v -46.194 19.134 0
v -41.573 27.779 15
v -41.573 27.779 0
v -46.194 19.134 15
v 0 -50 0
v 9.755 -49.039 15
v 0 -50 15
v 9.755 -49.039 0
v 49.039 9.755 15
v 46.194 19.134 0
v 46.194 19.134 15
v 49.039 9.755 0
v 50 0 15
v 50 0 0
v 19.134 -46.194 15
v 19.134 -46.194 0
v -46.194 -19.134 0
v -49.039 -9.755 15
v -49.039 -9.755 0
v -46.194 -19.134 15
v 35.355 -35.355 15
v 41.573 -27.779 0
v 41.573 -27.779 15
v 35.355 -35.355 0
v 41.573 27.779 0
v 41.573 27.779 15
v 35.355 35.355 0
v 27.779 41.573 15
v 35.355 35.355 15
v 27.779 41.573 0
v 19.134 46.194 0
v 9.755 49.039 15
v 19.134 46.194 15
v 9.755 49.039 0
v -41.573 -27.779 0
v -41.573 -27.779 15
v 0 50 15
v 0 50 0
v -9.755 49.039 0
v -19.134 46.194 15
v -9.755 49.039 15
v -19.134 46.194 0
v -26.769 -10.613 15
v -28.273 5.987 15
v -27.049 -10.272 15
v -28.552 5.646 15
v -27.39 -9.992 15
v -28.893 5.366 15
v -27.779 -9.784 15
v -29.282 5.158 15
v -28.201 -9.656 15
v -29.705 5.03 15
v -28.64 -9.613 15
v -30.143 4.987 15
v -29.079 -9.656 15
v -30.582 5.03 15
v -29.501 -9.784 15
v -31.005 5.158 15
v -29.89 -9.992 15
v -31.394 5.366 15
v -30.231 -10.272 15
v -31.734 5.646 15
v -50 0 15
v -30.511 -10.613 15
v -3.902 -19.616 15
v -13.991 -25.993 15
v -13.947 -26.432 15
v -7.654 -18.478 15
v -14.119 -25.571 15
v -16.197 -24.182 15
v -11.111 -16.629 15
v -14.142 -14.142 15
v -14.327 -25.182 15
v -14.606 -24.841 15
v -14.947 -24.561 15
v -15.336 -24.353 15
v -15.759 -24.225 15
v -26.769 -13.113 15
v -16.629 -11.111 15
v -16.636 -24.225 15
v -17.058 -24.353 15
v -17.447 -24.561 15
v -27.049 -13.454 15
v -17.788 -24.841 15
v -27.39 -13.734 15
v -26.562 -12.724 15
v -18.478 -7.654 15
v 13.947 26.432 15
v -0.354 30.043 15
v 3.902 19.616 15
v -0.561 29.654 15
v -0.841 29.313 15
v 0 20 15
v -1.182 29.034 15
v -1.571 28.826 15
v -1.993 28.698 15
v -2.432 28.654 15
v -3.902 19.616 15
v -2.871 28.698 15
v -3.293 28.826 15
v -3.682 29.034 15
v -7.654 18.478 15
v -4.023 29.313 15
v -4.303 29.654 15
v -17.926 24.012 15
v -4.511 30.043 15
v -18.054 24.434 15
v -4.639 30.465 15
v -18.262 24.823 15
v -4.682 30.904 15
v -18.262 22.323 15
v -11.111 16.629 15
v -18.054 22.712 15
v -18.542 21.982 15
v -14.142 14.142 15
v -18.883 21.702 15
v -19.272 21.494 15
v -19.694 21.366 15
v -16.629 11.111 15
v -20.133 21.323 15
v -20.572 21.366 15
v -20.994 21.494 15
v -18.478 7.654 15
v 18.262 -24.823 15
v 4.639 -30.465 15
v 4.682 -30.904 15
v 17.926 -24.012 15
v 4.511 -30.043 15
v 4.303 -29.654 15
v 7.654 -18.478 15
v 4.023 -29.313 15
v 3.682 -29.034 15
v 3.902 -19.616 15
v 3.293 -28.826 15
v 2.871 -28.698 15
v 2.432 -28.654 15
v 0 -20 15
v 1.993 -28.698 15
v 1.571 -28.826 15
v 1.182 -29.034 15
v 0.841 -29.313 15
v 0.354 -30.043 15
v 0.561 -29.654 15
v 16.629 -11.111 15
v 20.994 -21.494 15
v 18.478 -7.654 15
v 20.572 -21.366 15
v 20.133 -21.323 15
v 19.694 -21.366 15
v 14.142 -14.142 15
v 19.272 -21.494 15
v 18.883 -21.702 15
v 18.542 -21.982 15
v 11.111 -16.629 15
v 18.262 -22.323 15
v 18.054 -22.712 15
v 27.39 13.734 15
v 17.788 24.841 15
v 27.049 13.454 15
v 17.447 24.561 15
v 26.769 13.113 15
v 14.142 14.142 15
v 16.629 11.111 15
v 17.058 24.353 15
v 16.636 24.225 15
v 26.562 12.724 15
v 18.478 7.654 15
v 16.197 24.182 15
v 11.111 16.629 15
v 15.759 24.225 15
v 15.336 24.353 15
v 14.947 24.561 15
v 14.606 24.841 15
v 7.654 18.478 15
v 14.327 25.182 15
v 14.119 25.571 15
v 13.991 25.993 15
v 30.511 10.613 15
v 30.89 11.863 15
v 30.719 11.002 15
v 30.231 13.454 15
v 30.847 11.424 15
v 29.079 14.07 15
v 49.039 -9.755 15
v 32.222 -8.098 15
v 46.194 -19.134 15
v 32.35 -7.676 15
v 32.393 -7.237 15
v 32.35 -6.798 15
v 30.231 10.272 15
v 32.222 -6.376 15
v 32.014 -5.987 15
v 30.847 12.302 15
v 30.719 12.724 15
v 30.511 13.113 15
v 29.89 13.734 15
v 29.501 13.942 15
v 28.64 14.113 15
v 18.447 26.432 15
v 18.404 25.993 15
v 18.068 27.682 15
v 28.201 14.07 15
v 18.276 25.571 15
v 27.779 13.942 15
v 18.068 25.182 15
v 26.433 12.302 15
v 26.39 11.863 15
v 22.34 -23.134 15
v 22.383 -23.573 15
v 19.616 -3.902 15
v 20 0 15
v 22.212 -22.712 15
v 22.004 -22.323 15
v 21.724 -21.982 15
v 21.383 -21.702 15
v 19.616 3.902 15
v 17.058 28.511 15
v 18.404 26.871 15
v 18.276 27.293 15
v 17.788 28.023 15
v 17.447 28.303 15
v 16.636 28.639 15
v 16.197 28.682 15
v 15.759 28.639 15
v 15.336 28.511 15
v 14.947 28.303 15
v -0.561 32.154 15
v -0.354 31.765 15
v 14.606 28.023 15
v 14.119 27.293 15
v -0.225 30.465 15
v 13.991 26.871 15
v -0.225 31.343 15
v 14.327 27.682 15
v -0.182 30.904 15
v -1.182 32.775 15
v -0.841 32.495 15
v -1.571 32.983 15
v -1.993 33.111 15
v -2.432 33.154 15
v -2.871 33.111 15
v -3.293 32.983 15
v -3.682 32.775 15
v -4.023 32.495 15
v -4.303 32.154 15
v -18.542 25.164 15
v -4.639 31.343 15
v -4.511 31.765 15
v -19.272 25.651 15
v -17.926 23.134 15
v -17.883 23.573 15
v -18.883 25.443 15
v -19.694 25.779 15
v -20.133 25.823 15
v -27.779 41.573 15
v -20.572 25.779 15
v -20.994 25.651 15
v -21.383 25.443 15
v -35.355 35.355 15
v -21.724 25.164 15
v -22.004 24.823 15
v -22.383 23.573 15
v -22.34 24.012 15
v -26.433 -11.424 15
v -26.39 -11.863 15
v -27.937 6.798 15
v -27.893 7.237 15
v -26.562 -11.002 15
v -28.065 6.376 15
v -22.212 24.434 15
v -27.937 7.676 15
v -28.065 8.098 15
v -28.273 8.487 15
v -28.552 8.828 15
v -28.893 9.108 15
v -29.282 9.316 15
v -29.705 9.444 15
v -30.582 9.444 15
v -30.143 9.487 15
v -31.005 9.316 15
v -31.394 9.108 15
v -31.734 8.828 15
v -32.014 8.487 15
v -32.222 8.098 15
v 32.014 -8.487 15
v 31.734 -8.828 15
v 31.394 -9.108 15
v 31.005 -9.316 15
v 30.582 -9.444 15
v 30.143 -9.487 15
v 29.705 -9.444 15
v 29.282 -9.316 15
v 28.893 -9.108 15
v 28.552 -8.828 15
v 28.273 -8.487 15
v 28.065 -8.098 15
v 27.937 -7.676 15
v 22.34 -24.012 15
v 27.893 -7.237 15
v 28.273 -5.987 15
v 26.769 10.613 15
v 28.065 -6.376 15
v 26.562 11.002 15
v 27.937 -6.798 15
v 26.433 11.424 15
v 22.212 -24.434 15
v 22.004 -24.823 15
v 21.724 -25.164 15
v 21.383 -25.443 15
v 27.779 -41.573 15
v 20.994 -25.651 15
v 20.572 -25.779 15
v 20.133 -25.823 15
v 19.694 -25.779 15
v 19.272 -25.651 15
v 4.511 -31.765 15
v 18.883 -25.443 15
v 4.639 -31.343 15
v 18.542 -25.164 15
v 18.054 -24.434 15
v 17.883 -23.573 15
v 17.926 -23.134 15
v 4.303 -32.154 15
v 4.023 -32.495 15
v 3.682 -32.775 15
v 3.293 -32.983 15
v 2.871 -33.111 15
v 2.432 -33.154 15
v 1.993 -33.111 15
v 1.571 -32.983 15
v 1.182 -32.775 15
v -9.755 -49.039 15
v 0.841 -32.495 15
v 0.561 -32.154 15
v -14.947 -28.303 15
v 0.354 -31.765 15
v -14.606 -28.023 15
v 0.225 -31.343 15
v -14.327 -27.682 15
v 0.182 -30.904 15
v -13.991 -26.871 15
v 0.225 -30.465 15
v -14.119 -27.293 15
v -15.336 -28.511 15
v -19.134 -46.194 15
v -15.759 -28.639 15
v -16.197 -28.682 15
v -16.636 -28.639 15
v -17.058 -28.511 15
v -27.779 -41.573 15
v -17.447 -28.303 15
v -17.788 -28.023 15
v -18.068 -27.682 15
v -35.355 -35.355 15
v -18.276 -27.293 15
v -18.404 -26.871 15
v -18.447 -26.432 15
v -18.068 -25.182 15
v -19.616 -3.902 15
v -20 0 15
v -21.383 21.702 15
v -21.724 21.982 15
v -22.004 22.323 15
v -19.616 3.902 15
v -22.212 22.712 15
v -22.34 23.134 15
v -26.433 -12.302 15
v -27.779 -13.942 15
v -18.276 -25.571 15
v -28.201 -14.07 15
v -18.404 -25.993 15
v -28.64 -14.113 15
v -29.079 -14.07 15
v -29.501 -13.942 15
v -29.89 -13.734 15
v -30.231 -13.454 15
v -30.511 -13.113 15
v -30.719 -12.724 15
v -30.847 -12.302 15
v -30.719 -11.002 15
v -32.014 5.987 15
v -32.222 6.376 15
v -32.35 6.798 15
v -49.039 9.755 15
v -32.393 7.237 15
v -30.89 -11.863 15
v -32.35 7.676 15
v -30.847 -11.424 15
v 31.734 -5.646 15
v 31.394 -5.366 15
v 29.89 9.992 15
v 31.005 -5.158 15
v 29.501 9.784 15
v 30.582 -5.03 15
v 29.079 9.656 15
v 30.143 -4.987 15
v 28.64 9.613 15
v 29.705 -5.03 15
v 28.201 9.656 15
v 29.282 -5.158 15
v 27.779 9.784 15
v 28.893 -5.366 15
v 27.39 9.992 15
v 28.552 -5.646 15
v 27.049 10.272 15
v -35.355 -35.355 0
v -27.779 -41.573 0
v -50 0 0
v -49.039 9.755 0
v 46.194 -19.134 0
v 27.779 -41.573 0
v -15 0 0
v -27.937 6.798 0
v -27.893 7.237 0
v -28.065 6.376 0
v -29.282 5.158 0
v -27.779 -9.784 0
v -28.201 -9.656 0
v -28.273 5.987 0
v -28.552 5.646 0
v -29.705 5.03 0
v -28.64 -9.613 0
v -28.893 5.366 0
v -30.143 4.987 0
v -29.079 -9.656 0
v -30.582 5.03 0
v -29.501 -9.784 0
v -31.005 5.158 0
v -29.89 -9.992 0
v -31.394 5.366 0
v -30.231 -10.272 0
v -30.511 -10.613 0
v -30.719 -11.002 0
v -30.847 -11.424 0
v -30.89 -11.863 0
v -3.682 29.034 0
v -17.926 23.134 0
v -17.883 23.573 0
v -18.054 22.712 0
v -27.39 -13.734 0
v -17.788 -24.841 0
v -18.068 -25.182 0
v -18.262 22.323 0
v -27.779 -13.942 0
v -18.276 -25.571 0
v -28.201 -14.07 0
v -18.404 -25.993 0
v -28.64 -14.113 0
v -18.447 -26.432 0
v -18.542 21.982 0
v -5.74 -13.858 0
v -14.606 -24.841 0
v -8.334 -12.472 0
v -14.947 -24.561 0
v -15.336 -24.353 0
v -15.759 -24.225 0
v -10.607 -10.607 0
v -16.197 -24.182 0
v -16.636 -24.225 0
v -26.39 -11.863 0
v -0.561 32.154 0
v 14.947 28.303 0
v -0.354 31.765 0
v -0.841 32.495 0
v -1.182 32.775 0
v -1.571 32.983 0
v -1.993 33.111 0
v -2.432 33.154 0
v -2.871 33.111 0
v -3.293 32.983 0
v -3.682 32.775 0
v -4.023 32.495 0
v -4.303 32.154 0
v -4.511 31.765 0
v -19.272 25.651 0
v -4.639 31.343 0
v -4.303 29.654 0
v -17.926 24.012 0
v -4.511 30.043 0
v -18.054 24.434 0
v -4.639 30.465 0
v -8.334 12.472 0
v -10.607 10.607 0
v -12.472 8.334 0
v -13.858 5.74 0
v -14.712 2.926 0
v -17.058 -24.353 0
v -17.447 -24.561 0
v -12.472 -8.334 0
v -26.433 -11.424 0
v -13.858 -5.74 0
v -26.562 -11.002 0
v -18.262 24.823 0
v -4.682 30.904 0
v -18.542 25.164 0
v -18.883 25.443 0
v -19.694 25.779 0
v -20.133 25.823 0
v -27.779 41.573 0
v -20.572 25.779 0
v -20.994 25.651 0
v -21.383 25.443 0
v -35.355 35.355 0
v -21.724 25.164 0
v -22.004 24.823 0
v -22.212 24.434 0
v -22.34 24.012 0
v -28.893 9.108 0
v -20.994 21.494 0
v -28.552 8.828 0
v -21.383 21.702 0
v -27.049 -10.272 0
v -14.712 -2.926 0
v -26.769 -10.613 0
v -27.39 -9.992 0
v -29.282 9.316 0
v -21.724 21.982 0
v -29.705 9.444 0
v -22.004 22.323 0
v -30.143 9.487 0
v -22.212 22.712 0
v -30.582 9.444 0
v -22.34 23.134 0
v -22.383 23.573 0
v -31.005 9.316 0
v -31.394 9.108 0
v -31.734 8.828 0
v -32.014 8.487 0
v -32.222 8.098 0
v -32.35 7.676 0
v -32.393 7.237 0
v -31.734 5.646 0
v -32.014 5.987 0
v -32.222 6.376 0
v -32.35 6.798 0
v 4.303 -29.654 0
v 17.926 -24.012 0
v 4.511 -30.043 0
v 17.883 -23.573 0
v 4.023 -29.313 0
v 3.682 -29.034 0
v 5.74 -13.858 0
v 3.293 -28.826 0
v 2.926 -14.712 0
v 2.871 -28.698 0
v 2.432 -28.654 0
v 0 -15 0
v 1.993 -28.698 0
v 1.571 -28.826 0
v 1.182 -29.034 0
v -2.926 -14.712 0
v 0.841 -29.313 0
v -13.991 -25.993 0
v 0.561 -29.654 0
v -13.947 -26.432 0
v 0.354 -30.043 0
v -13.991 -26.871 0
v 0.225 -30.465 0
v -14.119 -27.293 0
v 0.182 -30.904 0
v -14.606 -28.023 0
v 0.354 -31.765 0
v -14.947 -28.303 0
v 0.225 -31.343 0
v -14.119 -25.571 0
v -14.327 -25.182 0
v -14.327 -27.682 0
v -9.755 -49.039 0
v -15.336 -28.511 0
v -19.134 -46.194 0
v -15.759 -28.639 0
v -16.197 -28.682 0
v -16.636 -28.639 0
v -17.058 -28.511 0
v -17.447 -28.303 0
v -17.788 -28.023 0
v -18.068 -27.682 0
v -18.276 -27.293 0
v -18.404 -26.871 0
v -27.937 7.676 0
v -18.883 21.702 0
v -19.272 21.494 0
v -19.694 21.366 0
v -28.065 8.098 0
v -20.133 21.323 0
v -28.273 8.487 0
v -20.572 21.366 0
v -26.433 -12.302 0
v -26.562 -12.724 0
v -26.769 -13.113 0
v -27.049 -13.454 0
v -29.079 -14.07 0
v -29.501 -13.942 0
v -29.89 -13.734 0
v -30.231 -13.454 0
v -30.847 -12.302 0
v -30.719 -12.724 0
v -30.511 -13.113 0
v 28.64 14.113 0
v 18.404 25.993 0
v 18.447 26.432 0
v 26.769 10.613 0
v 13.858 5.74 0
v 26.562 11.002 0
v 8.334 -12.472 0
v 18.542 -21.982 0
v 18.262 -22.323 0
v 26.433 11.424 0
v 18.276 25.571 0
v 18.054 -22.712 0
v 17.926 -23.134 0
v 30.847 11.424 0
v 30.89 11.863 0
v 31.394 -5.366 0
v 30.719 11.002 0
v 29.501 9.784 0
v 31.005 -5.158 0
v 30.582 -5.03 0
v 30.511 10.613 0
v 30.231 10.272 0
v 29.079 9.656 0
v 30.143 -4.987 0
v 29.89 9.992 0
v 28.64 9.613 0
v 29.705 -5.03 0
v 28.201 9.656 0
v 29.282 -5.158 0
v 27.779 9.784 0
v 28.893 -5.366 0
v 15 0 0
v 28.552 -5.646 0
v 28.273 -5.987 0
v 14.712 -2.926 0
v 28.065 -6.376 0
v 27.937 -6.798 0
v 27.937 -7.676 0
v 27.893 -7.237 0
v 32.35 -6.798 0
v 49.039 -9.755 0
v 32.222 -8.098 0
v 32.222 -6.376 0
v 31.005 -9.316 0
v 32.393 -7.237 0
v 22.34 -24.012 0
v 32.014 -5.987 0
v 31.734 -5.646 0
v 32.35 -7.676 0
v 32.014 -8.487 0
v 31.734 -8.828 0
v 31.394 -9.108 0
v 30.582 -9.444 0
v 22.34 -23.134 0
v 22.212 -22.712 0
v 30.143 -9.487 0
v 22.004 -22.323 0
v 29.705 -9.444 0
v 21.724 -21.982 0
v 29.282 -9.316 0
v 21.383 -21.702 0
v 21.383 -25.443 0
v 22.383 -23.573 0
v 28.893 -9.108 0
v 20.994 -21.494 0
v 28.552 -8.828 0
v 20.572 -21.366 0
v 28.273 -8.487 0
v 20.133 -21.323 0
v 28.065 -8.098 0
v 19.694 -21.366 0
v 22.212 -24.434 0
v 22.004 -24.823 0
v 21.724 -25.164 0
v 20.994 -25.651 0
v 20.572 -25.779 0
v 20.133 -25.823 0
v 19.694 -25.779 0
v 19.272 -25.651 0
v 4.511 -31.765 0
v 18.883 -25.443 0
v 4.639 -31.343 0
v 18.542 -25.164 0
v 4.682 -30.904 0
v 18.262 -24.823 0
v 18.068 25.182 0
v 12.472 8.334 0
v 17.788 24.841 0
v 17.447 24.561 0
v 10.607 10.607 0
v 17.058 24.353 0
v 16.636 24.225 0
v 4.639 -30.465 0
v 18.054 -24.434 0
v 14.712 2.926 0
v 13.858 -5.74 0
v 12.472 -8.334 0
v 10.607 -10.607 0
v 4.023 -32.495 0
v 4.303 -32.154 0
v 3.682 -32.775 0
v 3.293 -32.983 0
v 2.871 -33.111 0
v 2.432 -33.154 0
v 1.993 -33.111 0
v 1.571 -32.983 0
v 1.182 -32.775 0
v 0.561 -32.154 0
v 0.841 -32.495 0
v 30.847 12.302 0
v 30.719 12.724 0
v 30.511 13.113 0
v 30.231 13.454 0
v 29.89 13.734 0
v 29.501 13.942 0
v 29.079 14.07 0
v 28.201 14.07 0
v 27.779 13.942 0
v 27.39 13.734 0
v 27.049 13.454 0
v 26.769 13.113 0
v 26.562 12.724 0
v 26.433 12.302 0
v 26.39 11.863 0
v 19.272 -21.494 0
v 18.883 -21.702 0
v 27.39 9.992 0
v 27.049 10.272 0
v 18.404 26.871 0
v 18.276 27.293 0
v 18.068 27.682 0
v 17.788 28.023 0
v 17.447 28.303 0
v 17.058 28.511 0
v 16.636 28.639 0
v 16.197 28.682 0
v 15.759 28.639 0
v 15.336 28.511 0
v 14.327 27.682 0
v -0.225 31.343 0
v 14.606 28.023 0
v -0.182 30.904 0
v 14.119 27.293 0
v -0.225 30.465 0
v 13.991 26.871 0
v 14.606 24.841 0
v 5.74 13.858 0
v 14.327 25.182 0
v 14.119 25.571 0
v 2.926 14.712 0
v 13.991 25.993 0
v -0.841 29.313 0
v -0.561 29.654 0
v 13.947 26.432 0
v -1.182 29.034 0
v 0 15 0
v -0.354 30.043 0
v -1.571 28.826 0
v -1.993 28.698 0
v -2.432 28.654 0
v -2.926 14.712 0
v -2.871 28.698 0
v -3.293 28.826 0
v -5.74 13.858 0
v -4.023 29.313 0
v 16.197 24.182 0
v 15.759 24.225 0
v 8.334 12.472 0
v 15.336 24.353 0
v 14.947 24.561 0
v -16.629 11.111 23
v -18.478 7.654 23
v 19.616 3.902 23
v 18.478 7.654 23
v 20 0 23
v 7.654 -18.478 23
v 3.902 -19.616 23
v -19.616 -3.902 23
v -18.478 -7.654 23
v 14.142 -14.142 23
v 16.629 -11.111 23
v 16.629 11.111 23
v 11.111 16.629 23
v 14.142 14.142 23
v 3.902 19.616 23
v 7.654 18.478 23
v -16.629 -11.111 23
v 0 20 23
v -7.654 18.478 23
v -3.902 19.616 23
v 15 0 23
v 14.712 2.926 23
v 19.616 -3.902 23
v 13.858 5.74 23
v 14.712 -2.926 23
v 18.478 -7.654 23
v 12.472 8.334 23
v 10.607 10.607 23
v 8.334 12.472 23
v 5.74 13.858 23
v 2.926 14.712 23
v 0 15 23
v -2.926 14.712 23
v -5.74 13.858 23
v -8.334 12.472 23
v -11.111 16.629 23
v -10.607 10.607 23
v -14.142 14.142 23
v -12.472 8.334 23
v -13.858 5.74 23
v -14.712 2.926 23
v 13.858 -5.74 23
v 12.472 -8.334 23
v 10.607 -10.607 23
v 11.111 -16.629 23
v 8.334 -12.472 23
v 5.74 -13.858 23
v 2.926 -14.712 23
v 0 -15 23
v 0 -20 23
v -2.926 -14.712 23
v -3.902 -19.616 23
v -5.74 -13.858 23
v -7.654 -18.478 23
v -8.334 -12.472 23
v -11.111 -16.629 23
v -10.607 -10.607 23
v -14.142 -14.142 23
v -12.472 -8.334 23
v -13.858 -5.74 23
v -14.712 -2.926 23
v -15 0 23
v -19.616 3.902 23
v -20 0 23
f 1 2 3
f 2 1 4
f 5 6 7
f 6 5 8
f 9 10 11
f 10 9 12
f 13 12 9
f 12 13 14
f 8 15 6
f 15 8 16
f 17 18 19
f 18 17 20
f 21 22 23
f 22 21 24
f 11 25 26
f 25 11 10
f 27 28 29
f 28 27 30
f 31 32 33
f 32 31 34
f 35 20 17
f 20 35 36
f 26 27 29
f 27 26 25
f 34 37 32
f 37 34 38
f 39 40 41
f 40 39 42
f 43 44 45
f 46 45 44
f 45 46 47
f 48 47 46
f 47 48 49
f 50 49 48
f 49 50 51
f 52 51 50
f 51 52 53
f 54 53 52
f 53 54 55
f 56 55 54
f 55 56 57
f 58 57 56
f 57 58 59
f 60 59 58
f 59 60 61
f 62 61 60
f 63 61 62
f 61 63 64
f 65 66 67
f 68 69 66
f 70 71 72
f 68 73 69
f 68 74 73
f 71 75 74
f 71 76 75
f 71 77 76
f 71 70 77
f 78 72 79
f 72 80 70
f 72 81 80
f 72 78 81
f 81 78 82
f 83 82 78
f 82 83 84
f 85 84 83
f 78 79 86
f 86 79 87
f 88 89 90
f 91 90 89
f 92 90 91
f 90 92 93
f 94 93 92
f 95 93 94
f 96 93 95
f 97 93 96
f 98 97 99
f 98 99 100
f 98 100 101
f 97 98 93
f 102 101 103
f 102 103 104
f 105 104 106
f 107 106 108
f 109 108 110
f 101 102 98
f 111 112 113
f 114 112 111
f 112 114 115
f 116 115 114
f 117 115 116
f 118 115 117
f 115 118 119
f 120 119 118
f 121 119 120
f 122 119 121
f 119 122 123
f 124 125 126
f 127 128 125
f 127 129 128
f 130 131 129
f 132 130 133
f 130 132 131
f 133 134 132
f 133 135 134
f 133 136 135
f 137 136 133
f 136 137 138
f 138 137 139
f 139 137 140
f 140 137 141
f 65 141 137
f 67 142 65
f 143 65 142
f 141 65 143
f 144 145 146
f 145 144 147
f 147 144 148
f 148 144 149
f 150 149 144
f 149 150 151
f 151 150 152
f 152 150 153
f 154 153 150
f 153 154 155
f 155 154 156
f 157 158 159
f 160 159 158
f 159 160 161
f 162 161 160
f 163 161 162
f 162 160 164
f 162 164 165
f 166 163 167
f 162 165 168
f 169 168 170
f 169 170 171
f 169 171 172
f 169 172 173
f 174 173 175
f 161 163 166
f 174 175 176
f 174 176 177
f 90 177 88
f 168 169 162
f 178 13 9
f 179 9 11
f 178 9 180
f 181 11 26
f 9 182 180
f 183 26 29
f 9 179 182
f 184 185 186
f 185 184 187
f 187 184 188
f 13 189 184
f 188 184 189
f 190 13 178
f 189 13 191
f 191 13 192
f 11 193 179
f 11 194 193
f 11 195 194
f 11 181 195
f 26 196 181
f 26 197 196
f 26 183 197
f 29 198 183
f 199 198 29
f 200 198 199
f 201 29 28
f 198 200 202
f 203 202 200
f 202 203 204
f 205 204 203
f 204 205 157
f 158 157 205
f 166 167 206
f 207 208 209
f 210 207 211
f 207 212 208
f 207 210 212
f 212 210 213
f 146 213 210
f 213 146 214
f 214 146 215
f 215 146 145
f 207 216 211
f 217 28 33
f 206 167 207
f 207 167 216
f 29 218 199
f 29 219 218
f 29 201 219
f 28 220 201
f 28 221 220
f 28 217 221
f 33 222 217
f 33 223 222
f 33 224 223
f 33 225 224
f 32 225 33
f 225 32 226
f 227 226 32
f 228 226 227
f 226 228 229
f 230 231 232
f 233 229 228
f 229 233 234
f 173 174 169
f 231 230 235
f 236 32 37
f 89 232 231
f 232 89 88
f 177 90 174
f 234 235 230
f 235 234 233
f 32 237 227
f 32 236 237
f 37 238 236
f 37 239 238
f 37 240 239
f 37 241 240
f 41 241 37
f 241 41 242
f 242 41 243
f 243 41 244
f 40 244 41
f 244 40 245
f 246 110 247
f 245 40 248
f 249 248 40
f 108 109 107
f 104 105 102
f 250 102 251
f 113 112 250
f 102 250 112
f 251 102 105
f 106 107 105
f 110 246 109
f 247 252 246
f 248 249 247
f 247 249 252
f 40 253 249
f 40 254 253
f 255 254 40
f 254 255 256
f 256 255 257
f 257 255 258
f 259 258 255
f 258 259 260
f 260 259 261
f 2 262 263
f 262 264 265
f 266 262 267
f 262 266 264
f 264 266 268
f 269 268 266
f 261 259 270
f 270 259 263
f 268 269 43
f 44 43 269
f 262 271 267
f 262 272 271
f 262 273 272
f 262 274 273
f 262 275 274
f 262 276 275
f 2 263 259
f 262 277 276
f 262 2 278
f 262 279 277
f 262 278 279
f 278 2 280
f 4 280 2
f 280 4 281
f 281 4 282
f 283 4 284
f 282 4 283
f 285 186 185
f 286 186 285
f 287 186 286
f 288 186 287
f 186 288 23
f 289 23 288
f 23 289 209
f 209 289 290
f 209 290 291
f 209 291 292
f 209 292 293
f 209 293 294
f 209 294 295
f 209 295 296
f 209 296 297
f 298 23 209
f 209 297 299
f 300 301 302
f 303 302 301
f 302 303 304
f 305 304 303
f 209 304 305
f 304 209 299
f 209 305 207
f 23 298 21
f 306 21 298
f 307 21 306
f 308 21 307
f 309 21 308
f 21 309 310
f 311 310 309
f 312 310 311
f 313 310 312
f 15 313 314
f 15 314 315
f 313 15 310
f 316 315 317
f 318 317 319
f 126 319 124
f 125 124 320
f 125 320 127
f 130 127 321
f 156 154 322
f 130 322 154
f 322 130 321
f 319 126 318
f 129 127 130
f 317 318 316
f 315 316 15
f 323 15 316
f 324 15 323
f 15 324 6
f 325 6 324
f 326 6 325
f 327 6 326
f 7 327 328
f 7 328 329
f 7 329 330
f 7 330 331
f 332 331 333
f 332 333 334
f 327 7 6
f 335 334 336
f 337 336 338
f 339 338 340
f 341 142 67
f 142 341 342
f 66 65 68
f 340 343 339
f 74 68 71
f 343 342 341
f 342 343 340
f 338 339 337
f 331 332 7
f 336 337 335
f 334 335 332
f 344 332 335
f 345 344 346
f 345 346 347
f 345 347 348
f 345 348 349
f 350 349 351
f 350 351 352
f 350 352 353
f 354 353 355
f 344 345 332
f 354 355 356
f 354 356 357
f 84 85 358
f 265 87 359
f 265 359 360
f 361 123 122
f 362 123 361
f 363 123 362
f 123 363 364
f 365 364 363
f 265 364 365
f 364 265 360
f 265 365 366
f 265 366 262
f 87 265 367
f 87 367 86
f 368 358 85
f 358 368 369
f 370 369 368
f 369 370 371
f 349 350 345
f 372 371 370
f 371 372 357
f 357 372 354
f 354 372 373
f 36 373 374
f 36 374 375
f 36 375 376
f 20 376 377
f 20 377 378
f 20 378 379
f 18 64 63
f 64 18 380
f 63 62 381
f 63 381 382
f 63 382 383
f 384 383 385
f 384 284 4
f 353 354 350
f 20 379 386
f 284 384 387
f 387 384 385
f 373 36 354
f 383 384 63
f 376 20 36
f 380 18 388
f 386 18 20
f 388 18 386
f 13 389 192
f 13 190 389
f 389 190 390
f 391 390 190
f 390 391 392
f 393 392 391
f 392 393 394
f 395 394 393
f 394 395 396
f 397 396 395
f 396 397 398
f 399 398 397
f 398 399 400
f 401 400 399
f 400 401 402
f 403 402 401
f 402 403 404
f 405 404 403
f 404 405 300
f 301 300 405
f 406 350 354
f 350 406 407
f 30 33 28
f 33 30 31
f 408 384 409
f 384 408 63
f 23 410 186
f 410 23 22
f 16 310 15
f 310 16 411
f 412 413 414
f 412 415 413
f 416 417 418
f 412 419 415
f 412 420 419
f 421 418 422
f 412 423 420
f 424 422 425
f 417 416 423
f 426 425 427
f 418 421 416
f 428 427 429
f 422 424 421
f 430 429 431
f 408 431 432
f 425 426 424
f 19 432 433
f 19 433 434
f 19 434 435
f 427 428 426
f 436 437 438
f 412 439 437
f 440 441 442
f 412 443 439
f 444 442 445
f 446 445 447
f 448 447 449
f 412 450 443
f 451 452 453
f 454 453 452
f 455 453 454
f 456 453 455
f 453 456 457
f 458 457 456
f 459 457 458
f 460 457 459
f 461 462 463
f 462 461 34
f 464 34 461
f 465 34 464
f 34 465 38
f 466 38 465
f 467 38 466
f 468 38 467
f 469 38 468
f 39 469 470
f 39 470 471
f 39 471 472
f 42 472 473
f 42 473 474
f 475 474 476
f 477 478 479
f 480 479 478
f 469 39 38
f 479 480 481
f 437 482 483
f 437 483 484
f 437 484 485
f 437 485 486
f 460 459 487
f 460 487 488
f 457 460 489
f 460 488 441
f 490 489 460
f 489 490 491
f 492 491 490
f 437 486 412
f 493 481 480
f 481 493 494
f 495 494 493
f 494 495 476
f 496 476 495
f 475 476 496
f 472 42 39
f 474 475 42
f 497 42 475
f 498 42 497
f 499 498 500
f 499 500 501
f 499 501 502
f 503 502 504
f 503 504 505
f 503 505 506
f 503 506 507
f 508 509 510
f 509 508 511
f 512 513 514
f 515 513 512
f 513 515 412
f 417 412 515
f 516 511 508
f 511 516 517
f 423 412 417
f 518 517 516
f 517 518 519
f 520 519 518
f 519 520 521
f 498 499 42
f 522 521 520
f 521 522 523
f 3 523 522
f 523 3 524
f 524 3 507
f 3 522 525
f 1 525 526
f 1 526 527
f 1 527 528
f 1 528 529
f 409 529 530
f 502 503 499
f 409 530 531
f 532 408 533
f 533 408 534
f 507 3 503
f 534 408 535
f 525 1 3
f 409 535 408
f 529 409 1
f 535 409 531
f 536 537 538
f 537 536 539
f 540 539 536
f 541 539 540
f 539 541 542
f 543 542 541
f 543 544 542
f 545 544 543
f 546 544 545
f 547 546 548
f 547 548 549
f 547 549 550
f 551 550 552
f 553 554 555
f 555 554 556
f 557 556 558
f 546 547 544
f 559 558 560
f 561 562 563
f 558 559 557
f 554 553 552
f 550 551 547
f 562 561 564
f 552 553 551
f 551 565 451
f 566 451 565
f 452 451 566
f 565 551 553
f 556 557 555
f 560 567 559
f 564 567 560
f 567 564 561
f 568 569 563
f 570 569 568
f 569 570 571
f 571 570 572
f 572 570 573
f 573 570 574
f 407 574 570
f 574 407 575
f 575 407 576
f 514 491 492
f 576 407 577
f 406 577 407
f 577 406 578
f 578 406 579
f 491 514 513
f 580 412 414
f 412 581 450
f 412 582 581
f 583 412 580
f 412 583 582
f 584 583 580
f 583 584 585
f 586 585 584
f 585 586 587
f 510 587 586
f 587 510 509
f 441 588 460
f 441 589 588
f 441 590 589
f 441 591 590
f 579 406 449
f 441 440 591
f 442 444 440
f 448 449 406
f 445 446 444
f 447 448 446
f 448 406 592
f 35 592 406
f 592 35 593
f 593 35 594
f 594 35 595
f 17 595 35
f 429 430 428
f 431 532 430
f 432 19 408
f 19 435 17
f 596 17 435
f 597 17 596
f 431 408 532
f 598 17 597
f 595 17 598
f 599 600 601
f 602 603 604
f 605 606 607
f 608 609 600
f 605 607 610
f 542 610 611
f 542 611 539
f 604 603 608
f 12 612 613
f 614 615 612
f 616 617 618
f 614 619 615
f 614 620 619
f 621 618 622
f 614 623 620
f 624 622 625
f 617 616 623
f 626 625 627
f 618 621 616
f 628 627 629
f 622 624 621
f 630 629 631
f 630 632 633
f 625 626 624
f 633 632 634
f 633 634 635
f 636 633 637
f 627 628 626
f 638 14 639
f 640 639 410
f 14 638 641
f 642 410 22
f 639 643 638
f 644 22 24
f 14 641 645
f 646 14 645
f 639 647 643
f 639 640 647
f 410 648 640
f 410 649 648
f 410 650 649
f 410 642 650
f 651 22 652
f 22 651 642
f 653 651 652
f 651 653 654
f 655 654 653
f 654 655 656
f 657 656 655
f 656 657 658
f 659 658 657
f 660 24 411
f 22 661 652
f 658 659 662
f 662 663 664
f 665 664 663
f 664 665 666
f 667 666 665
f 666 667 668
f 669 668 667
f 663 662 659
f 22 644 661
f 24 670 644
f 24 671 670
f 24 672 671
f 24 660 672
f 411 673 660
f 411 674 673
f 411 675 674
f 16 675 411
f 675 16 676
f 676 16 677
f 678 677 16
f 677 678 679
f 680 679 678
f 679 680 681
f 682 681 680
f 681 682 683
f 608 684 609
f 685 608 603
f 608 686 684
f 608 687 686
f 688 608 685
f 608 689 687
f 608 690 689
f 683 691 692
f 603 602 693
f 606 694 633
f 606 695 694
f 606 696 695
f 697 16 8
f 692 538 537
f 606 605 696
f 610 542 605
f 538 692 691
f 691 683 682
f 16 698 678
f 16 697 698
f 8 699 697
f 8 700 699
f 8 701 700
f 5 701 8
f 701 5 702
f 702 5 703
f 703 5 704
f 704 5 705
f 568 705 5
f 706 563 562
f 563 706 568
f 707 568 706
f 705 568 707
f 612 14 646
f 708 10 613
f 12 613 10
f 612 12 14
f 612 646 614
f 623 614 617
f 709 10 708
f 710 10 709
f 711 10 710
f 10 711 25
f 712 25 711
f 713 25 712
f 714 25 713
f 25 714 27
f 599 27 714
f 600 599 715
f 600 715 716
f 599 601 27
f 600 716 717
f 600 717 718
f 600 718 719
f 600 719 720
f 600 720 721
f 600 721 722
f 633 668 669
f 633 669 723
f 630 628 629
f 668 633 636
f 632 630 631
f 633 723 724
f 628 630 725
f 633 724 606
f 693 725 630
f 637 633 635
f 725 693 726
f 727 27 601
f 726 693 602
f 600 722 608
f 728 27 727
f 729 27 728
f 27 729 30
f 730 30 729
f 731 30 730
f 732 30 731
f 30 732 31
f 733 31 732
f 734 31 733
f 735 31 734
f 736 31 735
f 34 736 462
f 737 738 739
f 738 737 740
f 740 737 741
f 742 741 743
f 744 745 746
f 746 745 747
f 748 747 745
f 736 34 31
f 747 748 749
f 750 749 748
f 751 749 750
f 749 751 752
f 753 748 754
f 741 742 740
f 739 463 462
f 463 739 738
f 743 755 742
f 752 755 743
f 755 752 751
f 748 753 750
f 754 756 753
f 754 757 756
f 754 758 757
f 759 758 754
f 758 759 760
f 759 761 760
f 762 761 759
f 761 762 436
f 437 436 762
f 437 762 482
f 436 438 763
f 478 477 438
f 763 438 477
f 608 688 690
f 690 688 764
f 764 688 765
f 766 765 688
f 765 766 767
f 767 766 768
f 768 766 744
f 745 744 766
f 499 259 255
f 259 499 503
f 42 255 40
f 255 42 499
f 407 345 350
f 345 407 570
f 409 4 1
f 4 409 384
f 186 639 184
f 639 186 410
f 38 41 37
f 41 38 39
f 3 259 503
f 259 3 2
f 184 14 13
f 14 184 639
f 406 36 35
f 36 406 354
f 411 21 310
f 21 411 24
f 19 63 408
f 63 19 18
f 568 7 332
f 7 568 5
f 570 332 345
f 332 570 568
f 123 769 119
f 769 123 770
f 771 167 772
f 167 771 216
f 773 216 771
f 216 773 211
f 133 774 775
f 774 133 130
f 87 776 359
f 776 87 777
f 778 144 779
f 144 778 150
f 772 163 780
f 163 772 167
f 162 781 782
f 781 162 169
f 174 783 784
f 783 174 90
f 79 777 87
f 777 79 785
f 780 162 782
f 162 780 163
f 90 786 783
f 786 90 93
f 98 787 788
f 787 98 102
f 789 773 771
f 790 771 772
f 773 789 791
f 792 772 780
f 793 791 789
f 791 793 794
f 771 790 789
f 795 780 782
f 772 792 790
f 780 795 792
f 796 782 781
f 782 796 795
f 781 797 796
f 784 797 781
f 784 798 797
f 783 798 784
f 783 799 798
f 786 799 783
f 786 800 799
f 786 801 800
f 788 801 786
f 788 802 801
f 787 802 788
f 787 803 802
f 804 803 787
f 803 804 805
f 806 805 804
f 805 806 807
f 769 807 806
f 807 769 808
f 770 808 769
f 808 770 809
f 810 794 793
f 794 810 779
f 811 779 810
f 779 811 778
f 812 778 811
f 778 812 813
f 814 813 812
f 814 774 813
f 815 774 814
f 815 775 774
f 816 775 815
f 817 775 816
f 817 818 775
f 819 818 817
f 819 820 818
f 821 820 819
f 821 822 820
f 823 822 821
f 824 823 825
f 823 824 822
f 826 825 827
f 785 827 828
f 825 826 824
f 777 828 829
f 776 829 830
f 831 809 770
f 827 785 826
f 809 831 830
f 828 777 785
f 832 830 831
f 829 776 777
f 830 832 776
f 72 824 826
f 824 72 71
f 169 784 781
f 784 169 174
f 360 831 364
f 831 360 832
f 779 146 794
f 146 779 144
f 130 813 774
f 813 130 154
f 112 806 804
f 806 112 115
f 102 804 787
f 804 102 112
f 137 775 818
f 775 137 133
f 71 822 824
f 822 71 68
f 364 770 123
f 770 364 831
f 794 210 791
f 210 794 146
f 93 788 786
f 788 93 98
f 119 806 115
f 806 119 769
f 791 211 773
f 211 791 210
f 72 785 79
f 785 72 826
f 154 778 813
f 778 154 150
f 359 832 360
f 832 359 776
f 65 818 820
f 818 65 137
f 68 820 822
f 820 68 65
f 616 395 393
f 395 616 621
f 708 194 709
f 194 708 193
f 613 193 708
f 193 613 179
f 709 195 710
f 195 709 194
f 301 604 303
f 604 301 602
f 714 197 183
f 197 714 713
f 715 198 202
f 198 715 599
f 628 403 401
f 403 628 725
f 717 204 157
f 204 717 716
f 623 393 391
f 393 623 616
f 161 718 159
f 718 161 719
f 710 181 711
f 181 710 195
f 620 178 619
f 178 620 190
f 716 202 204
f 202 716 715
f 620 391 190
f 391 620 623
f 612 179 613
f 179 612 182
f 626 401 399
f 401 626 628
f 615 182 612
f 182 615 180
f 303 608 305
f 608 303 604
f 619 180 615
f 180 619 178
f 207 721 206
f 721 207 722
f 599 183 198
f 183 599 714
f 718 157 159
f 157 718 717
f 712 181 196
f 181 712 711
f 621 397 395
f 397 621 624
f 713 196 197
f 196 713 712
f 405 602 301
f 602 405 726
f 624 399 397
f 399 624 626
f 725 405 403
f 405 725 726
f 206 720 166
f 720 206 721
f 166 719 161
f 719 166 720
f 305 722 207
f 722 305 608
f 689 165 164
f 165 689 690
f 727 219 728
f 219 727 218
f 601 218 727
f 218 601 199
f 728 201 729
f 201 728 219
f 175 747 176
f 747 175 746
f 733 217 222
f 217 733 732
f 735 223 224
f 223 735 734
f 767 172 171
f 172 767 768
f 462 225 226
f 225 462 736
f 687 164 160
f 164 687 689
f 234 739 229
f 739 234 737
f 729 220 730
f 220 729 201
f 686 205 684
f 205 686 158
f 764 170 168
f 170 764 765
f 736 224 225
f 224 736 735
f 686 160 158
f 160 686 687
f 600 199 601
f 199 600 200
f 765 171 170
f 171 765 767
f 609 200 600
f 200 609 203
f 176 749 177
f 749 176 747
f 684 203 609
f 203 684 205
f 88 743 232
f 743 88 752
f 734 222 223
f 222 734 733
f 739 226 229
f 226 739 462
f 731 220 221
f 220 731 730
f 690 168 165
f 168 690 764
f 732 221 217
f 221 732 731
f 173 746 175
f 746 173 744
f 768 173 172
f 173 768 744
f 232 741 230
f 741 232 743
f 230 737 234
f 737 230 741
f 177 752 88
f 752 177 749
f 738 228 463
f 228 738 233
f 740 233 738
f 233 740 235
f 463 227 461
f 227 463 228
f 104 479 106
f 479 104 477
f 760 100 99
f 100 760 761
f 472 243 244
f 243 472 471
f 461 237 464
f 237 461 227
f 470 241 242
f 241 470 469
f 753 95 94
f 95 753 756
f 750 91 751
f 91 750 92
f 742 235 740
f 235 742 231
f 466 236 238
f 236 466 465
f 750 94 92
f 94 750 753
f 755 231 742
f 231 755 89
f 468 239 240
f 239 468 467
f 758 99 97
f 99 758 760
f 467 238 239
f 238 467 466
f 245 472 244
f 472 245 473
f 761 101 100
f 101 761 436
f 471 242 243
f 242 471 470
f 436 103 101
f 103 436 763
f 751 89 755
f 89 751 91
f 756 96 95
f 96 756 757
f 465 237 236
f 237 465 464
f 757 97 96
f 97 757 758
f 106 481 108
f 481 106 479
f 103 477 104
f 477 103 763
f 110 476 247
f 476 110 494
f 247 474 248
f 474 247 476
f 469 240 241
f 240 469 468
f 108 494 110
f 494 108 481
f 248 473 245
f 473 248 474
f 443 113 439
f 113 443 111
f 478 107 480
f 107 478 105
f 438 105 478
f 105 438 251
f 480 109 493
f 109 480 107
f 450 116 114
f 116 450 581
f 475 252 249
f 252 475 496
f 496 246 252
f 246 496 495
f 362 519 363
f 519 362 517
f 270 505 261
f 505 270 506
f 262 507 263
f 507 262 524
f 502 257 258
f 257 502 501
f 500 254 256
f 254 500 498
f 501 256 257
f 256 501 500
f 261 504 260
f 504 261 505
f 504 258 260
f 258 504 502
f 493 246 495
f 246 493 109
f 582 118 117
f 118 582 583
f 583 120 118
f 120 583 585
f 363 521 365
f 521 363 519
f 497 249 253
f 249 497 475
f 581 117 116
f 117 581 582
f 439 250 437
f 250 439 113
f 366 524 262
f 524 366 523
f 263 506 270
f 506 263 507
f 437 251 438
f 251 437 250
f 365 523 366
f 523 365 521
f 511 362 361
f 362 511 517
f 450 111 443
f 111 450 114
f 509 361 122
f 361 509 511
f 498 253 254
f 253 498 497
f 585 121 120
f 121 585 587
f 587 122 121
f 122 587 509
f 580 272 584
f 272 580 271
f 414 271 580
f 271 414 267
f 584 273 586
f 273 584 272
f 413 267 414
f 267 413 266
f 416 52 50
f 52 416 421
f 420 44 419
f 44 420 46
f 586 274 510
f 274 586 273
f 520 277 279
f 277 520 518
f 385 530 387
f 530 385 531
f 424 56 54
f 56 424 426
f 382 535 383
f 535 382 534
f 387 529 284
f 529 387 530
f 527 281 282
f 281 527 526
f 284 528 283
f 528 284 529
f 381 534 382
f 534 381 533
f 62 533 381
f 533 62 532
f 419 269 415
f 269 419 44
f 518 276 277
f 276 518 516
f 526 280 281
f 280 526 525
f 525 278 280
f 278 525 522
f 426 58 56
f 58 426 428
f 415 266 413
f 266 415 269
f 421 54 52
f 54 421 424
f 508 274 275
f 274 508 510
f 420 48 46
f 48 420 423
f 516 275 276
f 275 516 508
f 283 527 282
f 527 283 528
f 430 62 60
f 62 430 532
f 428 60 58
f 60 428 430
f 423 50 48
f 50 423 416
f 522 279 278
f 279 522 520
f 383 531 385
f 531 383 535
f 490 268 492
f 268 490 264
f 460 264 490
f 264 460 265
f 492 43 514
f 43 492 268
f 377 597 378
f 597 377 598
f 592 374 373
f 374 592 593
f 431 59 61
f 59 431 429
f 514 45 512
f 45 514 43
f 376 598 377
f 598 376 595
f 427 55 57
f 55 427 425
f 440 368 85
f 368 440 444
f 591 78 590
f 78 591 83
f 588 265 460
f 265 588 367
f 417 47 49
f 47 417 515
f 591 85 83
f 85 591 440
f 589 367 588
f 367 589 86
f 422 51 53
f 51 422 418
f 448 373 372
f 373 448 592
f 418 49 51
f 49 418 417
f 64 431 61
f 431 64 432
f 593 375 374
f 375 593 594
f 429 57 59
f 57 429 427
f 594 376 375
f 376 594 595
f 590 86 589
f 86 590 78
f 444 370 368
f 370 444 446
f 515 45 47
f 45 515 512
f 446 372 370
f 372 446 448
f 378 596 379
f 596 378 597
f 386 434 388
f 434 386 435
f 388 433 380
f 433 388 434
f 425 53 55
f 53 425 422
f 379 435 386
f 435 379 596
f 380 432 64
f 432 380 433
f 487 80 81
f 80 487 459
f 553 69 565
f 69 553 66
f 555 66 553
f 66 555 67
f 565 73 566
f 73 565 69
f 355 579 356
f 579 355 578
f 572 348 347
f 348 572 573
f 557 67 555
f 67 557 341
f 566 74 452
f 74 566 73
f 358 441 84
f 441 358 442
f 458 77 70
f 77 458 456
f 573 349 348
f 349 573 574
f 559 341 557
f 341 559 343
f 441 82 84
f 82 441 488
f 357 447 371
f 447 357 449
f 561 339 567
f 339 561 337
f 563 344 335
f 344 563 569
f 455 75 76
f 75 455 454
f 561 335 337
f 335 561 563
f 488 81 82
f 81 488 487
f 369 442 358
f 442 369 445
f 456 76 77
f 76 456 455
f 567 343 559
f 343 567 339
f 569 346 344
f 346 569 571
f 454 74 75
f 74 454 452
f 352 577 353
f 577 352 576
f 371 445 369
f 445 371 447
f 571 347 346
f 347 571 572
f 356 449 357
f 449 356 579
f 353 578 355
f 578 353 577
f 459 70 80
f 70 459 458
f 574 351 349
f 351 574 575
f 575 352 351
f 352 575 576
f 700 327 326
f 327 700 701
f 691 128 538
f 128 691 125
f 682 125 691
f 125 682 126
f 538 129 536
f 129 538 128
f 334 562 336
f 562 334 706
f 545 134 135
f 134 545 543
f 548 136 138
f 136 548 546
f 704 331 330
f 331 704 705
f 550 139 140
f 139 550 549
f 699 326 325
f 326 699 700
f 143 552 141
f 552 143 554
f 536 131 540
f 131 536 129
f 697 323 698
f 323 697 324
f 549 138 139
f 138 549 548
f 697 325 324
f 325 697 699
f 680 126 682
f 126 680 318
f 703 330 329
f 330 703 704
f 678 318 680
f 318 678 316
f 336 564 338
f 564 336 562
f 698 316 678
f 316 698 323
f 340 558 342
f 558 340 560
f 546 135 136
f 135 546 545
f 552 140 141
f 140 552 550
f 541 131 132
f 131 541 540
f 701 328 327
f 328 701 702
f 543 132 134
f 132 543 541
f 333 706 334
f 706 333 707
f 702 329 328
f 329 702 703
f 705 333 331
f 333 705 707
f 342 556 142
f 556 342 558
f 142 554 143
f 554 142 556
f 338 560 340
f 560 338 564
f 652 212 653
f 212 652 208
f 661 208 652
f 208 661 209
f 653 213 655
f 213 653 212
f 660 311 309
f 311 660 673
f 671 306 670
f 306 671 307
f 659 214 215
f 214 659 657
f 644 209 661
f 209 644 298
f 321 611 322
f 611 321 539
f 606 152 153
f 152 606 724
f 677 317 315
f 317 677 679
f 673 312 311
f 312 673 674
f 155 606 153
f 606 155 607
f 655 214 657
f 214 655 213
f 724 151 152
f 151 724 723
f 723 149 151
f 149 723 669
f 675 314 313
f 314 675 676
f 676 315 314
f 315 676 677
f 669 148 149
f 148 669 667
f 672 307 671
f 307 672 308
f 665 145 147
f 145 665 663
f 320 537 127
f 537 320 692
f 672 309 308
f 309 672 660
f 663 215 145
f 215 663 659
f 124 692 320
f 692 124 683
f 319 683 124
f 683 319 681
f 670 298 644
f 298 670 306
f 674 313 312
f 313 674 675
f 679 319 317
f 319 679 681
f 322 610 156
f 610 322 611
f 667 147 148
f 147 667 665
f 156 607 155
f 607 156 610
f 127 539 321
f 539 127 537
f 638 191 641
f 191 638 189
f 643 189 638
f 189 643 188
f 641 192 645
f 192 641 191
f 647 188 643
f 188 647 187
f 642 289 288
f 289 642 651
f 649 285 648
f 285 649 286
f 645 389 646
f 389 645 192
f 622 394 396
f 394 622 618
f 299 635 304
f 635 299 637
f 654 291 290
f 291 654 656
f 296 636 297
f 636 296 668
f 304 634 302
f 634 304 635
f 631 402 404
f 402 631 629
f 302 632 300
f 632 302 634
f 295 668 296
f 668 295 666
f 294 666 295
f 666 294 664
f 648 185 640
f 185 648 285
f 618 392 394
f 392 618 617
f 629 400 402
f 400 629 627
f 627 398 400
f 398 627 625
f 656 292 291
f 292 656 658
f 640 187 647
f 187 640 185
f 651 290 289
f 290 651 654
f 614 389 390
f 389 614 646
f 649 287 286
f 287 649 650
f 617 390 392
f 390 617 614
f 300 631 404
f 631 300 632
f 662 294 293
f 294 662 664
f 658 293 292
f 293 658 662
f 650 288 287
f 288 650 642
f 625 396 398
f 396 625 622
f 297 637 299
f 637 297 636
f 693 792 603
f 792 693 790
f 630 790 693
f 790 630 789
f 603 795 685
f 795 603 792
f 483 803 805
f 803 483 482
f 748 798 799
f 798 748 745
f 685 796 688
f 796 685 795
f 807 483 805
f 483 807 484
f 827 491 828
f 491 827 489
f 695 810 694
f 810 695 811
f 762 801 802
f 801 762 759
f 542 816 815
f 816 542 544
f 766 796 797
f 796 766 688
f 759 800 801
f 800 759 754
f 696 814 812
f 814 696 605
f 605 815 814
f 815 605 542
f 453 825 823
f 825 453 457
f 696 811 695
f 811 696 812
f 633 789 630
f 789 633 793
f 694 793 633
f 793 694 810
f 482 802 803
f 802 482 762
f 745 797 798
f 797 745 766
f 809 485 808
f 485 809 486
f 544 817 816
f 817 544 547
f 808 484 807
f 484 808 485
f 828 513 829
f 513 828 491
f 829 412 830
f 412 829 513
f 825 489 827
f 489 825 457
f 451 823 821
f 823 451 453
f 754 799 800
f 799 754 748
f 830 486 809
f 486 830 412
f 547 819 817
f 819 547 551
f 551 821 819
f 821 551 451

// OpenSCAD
$fn = 32;

// ----------------------------------------------------------------------
// Flange Ø100 x 15
// 10 holes on a Ø62 bolt circle, bolted joints
// ----------------------------------------------------------------------

// --- parameters (mm) ---
flange_d = 100;    // outside diameter of the flange
thickness = 15;    // flange thickness
holes = 10;        // number of bolt holes
pcd = 62;          // bolt circle diameter
start_deg = 22.5;  // angle of the first hole, from +X
hole_d = 4.5;      // bolt hole diameter
bore_d = 30;       // central through bore
hub_d = 40;        // hub outside diameter
hub_h = 8;         // hub height above the flange face (0 = no hub)

// --- derived feature positions (mm) ---
height = thickness + hub_h;  // = 23   overall height of the part
pcd_r = pcd / 2;             // = 31   bolt circle radius
hole_step = 360 / holes;     // = 36   angular pitch
feature_centers = [
  [pcd_r * cos(start_deg + 0 * hole_step), pcd_r * sin(start_deg + 0 * hole_step)],
  [pcd_r * cos(start_deg + 1 * hole_step), pcd_r * sin(start_deg + 1 * hole_step)],
  [pcd_r * cos(start_deg + 2 * hole_step), pcd_r * sin(start_deg + 2 * hole_step)],
  [pcd_r * cos(start_deg + 3 * hole_step), pcd_r * sin(start_deg + 3 * hole_step)],
  [pcd_r * cos(start_deg + 4 * hole_step), pcd_r * sin(start_deg + 4 * hole_step)],
  [pcd_r * cos(start_deg + 5 * hole_step), pcd_r * sin(start_deg + 5 * hole_step)],
  [pcd_r * cos(start_deg + 6 * hole_step), pcd_r * sin(start_deg + 6 * hole_step)],
  [pcd_r * cos(start_deg + 7 * hole_step), pcd_r * sin(start_deg + 7 * hole_step)],
  [pcd_r * cos(start_deg + 8 * hole_step), pcd_r * sin(start_deg + 8 * hole_step)],
  [pcd_r * cos(start_deg + 9 * hole_step), pcd_r * sin(start_deg + 9 * hole_step)]
];   // bolt hole centres on the pitch circle

// flange disc, every hole and the bore cut straight through
difference() {
  union() {
    cylinder(d = flange_d, h = thickness);
    cylinder(d = hub_d, h = height);  // hub, overlapped into the flange
  }
  translate([0, 0, -1]) cylinder(d = bore_d, h = height + 2);  // bore, through
  for (centre = feature_centers)
    translate([centre[0], centre[1], -1]) cylinder(d = hole_d, h = thickness + 2);
}
